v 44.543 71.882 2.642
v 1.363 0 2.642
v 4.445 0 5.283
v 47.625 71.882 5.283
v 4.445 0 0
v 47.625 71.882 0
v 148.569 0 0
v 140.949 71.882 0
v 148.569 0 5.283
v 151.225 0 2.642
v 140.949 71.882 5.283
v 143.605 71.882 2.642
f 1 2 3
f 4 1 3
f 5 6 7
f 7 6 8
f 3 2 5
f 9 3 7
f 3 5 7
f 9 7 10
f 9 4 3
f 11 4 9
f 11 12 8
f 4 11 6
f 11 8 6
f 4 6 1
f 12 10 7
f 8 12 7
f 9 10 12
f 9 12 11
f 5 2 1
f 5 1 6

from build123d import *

# Parameters (mm, degrees)
BOSS_EXTRUDE1_DEPTH = 5.2832
CHAMFER3_SIZE       = 3.81


with BuildPart() as part:
    # Sketch2 → Boss-Extrude1 (new body)
    with BuildSketch(Plane.XY):
        Polygon((0, 0), (152.4, 0), (144.78, 71.882), (43.18, 71.882), align=None)
    extrude(amount=BOSS_EXTRUDE1_DEPTH)

    # Chamfer3
    # the kernel refuses this chamfer: 3.81 mm, written as the material it takes off along each edge
    with BuildSketch(Plane(origin=(153.432881845, -9.743518742, 5.2832), x_dir=(0.027342674184069608, 0.002898516697957921, -0.9996219169112969), z_dir=(-0.10541641348659767, 0.9944281672235671, 0))) as chamfer3_piece_1:
        Polygon((CHAMFER3_SIZE * 0.999621916911, CHAMFER3_SIZE * 0.0274958766106), (-CHAMFER3_SIZE * 0.0274958766106, CHAMFER3_SIZE * 0.999621916911), (0, 0), align=None)
    extrude(amount=91.880982955, mode=Mode.SUBTRACT)
    with BuildSketch(Plane(origin=(153.432881845, -9.743518742, 0), x_dir=(0.027342674184069608, 0.002898516697957921, 0.9996219169112969), z_dir=(-0.10541641348659767, 0.9944281672235671, 0))) as chamfer3_piece_2:
        Polygon((CHAMFER3_SIZE * 0.999621916911, -CHAMFER3_SIZE * 0.0274958766106), (-CHAMFER3_SIZE * 0.0274958766106, -CHAMFER3_SIZE * 0.999621916911), (0, 0), align=None)
    extrude(amount=91.880982955, mode=Mode.SUBTRACT)
    with BuildSketch(Plane(origin=(48.225451027, 80.281192003, 5.2832), x_dir=(-0.023570167662218693, 0.014158757959636668, -0.9996219169112966), z_dir=(-0.514941136817021, -0.8572255395248057, 0))) as chamfer3_piece_3:
        Polygon((CHAMFER3_SIZE * 0.999621916911, CHAMFER3_SIZE * 0.0274958766106), (-CHAMFER3_SIZE * 0.0274958766106, CHAMFER3_SIZE * 0.999621916911), (0, 0), align=None)
    extrude(amount=103.450468888, mode=Mode.SUBTRACT)
    with BuildSketch(Plane(origin=(48.225451027, 80.281192003, 0), x_dir=(-0.023570167662218693, 0.014158757959636668, 0.9996219169112966), z_dir=(-0.514941136817021, -0.8572255395248057, 0))) as chamfer3_piece_4:
        Polygon((CHAMFER3_SIZE * 0.999621916911, -CHAMFER3_SIZE * 0.0274958766106), (-CHAMFER3_SIZE * 0.0274958766106, -CHAMFER3_SIZE * 0.999621916911), (0, 0), align=None)
    extrude(amount=103.450468888, mode=Mode.SUBTRACT)


solid = part.part
